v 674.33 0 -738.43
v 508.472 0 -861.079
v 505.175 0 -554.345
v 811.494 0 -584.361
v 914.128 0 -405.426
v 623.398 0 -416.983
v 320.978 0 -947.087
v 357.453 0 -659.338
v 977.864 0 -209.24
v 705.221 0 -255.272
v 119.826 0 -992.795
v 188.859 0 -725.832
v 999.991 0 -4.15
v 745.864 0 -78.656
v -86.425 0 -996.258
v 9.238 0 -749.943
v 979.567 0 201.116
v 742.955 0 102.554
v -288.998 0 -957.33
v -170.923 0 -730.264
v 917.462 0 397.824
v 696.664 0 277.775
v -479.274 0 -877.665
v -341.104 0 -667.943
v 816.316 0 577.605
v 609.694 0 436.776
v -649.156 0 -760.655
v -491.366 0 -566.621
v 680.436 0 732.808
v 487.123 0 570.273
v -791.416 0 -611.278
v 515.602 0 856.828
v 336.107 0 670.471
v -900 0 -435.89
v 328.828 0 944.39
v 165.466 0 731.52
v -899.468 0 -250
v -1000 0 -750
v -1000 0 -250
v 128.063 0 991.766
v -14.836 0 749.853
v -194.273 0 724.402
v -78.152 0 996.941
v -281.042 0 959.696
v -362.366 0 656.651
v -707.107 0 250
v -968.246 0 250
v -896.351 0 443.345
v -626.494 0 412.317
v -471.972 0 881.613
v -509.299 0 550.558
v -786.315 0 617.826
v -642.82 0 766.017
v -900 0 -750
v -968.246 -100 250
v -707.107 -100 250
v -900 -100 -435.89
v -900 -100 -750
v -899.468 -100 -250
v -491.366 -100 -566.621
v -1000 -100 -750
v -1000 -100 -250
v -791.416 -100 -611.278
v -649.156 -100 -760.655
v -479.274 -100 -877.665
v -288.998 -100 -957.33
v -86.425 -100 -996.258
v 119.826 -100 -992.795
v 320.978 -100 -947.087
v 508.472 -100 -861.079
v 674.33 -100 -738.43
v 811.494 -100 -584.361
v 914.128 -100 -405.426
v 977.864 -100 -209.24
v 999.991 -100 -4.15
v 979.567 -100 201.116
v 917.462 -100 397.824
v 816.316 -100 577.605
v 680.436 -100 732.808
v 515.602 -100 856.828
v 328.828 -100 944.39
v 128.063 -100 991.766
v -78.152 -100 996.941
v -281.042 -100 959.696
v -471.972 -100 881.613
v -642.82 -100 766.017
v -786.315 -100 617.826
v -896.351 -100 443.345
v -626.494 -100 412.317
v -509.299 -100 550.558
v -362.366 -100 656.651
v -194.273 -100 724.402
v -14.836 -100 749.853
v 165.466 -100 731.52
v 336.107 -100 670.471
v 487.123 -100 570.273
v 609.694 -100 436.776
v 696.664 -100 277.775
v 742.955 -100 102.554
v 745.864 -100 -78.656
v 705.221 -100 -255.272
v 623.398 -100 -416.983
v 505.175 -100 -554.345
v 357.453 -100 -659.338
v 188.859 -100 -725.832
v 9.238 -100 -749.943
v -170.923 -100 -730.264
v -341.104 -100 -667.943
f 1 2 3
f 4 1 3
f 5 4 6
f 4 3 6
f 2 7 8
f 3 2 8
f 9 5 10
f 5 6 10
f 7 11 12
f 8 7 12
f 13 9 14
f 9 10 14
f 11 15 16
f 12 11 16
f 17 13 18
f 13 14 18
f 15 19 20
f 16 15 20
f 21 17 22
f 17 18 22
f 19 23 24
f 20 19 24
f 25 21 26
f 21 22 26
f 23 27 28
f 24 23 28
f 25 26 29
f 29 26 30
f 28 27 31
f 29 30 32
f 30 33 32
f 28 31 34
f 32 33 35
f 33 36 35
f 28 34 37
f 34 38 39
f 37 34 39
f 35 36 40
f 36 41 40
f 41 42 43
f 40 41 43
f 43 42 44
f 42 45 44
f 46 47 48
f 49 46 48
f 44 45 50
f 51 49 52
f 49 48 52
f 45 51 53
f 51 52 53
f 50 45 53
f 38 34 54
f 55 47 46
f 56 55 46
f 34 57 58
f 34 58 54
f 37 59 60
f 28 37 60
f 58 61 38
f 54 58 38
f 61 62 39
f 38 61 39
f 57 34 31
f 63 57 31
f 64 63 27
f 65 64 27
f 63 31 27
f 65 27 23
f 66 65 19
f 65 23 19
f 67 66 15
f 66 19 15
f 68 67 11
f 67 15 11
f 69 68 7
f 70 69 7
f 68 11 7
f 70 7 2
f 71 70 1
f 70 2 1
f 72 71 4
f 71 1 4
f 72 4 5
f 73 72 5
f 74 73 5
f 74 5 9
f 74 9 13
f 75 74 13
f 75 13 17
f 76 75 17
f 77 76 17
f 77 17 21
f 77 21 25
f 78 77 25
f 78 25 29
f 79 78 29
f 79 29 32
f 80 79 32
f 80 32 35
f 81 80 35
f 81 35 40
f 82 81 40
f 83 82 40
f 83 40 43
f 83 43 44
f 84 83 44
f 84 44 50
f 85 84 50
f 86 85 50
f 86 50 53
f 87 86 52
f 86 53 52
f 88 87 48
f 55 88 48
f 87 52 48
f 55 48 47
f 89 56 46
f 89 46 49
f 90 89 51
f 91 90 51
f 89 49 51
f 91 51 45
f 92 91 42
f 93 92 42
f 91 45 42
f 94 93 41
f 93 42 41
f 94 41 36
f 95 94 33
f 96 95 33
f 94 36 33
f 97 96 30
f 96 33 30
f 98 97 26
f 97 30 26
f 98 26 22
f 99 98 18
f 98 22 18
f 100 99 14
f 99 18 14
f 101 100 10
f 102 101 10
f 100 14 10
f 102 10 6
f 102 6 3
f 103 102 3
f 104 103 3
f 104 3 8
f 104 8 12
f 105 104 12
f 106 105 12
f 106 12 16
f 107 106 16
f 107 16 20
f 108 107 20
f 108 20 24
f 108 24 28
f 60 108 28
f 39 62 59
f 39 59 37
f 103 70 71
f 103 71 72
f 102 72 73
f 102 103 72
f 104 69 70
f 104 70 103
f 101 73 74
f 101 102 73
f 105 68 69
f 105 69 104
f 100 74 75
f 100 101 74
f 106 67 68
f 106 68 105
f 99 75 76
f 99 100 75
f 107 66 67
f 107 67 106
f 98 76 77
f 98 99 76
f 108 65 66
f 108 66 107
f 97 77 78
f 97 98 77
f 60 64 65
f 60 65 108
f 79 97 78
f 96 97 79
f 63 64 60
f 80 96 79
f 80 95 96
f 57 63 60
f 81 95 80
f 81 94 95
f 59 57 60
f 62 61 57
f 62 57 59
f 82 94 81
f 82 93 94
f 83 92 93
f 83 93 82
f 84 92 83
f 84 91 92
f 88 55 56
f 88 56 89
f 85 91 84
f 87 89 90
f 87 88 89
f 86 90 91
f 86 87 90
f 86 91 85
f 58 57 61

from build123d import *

# Parameters (mm, degrees)
F1_DEPTH = 100
F4_W     = 100
F4_H     = 500
F5_DEPTH = 100
F7_DEPTH = 100


with BuildPart() as f1:
    # F0 (on Front) → F1 (new body)
    with BuildSketch(Plane.XZ):
        with BuildLine():
            ThreePointArc((-707.1067811865, 250), (126.8264840443, 739.1989197401), (750, 0))
            ThreePointArc((750, 0), (126.8264840443, -739.1989197401), (-707.1067811865, -250))
            Line((-707.1067811865, -250), (-968.2458365519, -250))
            ThreePointArc((-968.2458365519, -250), (126.0042924827, -992.0296962672), (1000, 0))
            ThreePointArc((1000, 0), (126.0042924827, 992.0296962672), (-968.2458365519, 250))
            Line((-968.2458365519, 250), (-707.1067811865, 250))
        make_face()
    extrude(amount=F1_DEPTH)

    # F4 (on offset) → F5 (join)
    with BuildSketch(Plane.YZ.offset(-1000)):
        with Locations((-50, -500)):
            Rectangle(F4_W, F4_H)
    extrude(amount=F5_DEPTH)

    # F6 (on face) → F7 (cut)
    with BuildSketch(Plane.XZ.offset(100)):
        with BuildLine():
            Line((-707.1067811865, -250), (-899.4680664961, -250))
            Line((-899.4680664961, -250), (-491.3664999003, -566.6206515613))
            ThreePointArc((-491.3664999003, -566.6206515613), (-619.7957007099, -422.3189427216), (-707.1067811865, -250))
        make_face()
    extrude(amount=-F7_DEPTH, mode=Mode.SUBTRACT)


solid = f1.part
